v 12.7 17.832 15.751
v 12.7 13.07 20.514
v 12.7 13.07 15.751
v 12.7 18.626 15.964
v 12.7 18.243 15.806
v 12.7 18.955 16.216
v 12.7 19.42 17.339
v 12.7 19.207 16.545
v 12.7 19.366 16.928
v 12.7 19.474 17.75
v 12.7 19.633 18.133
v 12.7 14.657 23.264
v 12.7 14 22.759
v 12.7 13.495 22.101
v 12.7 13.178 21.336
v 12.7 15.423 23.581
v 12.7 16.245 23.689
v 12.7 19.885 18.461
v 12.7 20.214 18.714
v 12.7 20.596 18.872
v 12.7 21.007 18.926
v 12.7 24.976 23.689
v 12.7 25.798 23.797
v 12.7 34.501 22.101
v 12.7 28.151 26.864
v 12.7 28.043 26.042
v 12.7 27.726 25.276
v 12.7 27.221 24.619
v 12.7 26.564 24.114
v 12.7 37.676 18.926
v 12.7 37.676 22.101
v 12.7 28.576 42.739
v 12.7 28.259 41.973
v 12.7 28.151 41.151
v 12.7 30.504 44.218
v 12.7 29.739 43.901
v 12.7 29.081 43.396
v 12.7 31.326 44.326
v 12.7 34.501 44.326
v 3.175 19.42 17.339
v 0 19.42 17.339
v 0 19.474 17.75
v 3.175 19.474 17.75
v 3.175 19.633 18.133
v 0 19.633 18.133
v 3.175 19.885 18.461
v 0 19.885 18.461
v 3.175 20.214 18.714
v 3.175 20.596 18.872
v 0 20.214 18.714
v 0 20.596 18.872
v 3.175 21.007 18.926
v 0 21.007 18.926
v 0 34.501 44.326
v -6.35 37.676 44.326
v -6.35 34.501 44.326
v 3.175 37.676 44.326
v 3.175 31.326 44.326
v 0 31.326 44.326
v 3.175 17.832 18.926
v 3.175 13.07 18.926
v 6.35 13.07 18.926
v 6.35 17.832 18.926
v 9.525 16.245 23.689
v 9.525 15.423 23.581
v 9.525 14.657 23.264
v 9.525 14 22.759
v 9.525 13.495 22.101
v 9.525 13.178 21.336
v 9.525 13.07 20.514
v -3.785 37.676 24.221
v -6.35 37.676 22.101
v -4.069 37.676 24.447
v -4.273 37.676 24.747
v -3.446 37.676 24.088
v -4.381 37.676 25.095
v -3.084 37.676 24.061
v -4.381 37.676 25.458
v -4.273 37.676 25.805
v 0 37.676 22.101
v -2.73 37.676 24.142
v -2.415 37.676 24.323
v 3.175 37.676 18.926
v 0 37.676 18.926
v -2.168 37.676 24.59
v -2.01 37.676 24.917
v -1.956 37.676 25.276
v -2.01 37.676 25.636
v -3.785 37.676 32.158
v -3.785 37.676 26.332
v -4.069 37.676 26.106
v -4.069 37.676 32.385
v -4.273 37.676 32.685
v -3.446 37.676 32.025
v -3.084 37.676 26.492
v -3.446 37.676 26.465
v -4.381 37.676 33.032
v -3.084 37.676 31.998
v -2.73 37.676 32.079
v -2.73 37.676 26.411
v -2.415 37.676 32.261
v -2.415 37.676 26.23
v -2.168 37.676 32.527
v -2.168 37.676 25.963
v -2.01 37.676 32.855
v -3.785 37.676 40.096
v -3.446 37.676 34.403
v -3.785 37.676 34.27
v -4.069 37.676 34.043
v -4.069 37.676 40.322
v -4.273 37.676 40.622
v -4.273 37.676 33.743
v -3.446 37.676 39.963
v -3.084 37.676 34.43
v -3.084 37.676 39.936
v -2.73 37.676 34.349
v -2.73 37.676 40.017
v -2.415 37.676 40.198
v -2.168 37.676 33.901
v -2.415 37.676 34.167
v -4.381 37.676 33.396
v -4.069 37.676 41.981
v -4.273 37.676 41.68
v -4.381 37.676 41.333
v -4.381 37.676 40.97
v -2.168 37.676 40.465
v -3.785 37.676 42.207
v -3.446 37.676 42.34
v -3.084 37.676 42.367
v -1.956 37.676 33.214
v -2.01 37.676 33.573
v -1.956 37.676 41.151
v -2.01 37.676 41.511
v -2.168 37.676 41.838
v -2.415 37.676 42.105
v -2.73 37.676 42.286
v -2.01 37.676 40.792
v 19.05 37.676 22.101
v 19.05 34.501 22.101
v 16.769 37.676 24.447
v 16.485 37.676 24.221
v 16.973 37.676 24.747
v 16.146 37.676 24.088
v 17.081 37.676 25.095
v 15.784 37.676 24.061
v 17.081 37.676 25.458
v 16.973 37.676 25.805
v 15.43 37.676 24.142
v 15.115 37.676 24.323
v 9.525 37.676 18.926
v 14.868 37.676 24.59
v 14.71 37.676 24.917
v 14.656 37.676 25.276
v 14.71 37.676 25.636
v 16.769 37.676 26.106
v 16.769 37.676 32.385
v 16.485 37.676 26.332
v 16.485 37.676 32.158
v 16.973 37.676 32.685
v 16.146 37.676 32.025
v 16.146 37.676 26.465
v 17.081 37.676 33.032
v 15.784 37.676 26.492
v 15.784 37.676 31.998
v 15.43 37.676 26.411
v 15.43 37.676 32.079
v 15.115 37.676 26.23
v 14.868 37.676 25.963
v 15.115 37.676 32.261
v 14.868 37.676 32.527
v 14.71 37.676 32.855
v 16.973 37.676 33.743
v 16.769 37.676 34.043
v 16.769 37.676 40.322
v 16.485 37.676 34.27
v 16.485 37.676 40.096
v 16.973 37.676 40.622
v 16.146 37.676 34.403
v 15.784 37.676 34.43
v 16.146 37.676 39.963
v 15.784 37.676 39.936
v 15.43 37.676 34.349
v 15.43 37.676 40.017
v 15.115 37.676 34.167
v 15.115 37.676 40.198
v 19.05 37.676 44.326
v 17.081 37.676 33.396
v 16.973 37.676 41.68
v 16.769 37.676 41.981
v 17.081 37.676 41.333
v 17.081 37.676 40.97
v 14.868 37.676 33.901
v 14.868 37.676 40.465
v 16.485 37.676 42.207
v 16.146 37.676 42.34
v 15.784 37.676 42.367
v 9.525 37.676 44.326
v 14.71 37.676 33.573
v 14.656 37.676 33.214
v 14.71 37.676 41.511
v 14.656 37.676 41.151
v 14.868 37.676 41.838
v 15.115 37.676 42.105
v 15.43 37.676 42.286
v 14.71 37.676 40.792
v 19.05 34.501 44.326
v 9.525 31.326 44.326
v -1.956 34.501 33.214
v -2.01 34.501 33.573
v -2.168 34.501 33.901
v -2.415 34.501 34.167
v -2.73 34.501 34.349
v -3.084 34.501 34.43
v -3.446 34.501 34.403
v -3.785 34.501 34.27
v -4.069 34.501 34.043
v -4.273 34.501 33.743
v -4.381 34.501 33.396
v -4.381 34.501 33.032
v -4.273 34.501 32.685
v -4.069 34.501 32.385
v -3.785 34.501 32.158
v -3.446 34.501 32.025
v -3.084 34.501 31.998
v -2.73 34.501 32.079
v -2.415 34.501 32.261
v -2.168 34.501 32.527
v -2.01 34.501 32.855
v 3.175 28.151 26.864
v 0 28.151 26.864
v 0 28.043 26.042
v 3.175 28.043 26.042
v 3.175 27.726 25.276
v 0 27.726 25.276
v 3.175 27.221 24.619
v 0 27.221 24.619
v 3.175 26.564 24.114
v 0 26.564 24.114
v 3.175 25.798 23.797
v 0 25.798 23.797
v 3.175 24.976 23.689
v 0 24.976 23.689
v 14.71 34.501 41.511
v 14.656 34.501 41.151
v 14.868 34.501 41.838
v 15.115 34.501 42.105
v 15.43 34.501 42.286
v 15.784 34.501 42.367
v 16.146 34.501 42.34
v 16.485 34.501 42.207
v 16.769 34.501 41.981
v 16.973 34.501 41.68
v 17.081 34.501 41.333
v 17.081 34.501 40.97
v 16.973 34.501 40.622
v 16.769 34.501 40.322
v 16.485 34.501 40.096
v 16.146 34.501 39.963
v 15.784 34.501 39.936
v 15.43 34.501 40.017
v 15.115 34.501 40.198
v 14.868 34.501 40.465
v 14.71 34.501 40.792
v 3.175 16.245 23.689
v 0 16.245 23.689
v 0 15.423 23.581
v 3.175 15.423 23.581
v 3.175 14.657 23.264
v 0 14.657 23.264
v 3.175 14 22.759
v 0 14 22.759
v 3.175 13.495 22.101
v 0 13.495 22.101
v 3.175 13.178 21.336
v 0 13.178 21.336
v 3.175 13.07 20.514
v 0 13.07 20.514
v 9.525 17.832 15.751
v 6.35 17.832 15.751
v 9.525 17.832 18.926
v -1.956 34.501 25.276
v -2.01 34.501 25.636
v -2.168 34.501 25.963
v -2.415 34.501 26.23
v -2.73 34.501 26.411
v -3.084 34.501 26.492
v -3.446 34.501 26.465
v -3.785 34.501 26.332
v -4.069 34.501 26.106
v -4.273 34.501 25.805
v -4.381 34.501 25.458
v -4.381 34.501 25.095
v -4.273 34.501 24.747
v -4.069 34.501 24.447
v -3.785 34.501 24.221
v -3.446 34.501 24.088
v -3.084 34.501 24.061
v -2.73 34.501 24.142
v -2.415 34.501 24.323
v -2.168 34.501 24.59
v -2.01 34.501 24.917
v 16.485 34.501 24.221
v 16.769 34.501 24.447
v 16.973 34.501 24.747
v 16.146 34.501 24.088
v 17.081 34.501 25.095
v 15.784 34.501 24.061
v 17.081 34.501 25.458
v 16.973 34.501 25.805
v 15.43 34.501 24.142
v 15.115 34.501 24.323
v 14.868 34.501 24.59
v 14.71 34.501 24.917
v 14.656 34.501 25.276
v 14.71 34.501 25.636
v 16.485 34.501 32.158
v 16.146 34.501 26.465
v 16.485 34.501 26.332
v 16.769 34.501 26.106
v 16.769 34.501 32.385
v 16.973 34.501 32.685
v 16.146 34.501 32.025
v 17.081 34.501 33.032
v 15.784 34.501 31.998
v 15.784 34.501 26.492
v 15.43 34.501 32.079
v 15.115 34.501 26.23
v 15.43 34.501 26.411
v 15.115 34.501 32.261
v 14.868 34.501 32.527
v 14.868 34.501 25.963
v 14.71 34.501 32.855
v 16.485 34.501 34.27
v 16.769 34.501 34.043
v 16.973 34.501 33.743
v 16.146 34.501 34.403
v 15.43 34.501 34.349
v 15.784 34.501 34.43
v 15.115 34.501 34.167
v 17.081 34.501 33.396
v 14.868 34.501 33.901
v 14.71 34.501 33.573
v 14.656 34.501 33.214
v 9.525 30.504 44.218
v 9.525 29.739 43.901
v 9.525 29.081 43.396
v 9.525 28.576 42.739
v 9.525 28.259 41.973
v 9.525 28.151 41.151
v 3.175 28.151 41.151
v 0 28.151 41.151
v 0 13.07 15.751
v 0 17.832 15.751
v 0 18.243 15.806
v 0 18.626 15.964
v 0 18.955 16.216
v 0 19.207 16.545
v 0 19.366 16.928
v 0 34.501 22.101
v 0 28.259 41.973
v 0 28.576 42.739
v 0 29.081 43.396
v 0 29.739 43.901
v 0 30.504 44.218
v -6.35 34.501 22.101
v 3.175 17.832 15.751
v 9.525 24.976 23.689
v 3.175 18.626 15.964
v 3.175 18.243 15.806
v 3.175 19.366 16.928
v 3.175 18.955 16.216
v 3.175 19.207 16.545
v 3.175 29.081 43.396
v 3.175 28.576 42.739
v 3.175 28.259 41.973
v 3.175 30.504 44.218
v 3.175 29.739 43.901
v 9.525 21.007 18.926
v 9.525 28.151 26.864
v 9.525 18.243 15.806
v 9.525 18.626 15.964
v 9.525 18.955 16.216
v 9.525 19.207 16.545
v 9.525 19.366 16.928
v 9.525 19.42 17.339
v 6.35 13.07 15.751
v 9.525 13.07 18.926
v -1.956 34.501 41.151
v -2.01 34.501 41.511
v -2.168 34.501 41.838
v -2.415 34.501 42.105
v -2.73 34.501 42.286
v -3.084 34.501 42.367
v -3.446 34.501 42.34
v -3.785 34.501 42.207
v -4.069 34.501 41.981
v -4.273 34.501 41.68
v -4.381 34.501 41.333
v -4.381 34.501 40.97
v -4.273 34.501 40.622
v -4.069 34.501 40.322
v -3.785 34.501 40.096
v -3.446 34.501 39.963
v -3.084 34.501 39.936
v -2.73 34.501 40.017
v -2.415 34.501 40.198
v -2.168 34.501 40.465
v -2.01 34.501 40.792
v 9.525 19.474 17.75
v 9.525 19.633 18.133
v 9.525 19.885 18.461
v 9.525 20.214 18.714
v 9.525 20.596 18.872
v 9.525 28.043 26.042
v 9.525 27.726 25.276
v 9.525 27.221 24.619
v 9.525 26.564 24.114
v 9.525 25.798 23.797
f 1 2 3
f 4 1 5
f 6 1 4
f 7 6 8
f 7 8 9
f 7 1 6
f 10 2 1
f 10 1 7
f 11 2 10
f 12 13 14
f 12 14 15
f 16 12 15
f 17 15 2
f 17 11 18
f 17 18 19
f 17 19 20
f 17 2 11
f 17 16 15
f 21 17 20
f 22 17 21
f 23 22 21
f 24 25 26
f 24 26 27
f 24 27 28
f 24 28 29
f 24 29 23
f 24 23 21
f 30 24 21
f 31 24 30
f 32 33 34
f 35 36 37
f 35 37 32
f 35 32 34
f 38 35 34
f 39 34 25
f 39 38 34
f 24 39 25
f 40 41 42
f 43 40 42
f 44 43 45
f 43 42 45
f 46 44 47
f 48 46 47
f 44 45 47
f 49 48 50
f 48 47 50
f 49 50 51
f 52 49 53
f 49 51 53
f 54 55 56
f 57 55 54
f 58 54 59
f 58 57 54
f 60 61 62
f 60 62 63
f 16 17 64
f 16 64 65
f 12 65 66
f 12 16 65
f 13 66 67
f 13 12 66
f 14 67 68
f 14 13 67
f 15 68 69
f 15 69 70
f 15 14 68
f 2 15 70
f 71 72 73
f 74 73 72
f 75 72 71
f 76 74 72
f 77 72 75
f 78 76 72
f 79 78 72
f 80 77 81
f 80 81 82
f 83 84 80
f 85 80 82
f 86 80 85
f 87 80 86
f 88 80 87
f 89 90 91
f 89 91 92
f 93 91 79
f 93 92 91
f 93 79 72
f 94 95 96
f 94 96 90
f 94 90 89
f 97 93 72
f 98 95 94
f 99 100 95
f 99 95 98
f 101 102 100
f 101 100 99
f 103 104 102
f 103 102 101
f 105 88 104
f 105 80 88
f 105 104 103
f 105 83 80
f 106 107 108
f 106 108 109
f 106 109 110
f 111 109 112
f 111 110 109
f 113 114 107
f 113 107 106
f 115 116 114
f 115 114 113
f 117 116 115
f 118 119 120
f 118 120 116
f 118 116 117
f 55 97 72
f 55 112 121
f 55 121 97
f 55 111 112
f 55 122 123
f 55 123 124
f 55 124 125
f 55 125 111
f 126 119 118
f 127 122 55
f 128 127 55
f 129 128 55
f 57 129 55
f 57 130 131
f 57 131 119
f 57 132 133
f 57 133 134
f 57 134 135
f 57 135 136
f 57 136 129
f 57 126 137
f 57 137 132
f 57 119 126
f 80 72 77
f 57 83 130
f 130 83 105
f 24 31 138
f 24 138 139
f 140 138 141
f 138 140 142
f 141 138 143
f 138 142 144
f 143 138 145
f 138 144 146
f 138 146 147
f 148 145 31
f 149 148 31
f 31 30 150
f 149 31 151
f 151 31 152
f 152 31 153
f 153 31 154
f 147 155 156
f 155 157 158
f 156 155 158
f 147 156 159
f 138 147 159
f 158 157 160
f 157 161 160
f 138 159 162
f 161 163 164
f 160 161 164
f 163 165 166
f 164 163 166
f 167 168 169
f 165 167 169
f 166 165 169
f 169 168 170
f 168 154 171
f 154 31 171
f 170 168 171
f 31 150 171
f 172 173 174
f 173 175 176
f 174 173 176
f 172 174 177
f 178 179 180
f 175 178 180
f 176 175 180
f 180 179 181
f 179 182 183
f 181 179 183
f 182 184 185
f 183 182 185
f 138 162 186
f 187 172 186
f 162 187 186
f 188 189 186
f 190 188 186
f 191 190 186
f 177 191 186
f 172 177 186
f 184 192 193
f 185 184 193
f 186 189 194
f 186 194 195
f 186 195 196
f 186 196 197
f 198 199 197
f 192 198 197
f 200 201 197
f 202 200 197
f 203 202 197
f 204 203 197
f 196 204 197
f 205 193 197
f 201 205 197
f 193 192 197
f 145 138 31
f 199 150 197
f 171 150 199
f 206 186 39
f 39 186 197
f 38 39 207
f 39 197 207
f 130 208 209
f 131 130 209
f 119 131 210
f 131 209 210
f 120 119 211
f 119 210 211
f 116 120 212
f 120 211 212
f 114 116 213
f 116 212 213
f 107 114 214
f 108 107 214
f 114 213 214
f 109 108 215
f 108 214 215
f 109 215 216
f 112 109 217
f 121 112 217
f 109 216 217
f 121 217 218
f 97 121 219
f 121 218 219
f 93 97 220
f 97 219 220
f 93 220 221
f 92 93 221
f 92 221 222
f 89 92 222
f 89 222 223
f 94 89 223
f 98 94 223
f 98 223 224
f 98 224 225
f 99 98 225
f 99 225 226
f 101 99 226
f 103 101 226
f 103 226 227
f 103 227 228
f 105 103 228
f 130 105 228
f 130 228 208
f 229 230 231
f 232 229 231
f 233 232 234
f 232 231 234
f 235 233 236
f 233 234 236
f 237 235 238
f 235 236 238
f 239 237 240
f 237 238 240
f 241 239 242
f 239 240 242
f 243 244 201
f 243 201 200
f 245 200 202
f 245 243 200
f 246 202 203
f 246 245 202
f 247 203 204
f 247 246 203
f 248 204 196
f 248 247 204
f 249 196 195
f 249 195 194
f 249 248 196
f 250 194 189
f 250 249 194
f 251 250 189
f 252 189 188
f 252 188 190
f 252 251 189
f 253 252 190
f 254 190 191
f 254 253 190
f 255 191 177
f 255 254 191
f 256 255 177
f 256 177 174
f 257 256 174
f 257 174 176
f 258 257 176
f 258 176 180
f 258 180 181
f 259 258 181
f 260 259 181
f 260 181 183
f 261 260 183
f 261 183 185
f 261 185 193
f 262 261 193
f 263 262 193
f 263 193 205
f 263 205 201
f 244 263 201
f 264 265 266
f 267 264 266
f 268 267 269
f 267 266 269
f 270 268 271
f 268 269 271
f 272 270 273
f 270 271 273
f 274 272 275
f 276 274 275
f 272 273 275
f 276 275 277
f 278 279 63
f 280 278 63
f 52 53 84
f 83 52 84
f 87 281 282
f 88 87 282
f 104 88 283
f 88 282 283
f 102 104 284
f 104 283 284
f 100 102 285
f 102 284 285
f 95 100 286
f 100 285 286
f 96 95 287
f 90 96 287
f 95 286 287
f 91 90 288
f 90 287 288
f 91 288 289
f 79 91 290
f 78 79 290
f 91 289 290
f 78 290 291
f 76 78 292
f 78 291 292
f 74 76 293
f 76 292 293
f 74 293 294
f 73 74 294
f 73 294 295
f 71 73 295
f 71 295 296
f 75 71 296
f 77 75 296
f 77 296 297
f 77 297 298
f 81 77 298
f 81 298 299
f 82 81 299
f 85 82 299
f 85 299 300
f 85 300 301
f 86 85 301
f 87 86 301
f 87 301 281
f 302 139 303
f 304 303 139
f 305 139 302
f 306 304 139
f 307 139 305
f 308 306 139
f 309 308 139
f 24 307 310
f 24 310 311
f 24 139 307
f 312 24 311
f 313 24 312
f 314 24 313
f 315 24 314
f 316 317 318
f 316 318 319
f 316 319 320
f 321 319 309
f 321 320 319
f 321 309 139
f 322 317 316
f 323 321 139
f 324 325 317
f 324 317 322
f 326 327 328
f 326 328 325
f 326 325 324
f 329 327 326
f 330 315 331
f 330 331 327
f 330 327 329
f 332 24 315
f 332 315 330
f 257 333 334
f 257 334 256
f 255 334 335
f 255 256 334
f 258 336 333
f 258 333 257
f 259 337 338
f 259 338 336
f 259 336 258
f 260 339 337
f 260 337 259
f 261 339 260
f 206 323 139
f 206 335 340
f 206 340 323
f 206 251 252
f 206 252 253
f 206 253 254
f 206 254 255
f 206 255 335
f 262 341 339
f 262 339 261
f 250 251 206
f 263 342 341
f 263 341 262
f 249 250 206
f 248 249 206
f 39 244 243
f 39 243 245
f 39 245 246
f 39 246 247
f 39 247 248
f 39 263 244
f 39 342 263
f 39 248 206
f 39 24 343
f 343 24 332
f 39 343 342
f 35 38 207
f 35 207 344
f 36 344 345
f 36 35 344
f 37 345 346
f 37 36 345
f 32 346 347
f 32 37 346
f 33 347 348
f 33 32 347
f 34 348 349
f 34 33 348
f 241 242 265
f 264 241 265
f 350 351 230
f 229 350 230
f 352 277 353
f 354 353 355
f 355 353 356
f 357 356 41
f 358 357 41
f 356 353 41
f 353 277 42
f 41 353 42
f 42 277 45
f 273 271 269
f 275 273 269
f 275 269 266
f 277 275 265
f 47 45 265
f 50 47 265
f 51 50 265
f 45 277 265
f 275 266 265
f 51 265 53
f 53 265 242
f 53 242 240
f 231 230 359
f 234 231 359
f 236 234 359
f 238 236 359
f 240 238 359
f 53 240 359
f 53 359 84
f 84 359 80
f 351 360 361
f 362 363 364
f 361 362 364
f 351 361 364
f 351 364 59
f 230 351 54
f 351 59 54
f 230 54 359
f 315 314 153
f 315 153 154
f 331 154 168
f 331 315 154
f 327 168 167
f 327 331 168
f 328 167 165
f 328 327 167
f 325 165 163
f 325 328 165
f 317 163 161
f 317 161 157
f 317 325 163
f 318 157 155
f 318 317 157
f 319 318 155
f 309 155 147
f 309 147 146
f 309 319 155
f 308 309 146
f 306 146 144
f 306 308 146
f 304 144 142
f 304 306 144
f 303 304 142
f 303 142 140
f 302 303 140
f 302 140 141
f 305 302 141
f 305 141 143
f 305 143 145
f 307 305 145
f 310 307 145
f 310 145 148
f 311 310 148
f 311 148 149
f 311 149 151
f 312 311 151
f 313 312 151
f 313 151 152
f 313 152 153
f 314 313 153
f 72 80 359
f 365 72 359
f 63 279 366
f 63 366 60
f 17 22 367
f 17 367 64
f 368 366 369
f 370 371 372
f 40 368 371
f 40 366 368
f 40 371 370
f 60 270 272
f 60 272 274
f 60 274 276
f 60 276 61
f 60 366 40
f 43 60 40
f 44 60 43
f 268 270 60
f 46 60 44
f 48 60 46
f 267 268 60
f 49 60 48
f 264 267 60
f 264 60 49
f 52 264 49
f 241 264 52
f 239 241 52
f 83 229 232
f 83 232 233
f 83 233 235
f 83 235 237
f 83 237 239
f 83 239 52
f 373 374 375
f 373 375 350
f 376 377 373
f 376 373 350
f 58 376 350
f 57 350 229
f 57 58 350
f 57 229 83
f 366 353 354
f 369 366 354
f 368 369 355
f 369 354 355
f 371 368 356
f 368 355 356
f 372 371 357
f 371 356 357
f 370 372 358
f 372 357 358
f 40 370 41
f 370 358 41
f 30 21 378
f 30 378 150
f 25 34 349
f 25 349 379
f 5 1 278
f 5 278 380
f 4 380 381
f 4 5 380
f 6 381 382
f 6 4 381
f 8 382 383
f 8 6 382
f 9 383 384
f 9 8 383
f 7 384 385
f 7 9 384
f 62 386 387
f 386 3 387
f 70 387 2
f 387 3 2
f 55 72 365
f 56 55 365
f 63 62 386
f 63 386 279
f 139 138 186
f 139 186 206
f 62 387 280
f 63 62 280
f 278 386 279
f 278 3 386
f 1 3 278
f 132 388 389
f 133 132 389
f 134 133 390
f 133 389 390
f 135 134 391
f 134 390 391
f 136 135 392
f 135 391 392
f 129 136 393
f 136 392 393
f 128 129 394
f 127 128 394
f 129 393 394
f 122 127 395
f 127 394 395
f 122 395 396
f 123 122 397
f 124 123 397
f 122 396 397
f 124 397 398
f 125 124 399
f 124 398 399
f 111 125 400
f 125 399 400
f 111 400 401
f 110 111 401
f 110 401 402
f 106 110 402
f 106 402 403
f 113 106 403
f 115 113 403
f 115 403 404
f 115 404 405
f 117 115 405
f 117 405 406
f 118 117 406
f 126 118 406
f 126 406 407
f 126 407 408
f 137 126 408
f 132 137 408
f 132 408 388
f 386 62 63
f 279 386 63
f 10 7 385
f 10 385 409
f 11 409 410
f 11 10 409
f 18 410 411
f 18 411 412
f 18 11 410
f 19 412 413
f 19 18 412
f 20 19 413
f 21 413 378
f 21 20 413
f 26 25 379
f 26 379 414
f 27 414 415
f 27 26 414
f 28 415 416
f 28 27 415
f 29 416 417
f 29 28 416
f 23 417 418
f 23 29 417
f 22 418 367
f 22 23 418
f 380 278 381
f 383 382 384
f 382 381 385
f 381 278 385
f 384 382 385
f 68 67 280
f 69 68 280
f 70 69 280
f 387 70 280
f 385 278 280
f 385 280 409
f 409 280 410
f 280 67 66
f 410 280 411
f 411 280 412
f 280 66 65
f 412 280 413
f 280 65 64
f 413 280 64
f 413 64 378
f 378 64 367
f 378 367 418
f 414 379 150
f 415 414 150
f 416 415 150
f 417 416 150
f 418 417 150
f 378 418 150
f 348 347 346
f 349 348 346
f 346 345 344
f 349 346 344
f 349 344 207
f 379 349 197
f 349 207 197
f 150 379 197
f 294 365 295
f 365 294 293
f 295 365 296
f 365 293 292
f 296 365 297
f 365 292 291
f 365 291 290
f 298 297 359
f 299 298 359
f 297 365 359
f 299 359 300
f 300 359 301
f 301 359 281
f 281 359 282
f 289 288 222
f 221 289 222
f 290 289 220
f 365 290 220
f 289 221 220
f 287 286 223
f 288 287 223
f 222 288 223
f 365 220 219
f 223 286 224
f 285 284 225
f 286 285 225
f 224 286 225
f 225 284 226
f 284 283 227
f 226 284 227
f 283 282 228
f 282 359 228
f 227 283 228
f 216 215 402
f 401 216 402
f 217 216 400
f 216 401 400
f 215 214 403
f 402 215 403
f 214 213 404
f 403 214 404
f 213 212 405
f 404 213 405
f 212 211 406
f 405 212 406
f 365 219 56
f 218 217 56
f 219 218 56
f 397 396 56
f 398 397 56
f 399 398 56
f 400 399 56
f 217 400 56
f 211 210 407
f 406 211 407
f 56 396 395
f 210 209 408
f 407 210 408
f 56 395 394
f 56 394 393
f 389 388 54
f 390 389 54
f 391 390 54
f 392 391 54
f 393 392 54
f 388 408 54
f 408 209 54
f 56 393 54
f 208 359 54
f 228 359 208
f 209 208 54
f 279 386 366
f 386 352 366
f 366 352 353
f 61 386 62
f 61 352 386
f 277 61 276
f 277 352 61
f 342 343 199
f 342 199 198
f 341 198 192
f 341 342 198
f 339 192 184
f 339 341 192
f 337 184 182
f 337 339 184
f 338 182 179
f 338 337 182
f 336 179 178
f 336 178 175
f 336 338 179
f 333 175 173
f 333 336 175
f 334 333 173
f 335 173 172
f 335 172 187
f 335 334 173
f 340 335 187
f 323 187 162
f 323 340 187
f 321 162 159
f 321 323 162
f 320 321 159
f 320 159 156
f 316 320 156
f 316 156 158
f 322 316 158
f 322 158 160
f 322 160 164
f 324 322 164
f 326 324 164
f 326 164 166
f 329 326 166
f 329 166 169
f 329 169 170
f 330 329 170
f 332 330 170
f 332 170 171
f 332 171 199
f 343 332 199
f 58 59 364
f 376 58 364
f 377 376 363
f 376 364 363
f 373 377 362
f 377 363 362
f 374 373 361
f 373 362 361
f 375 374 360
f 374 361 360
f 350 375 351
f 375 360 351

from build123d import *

# Parameters (mm, degrees)
F1_DEPTH = 3.175
F2_W     = 4.7625
F2_H     = 3.175
F3_DEPTH = 3.175
F4_W     = 3.175
F4_H     = 22.225
F5_DEPTH = 6.35
F6_R     = 1.2192
F7_DEPTH = 25.4


with BuildPart() as f1:
    # F0 (on Right) → F1 (new body)
    with BuildSketch(Plane.YZ):
        with BuildLine():
            Line((37.6760785595, 44.3264348761), (31.3260785595, 44.3264348761))
            ThreePointArc((31.3260785595, 44.3264348761), (29.0810145292, 43.3964989063), (28.1510785595, 41.1514348761))
            Line((28.1510785595, 41.1514348761), (28.1510785595, 26.8639348761))
            ThreePointArc((28.1510785595, 26.8639348761), (27.2211425898, 24.6188708458), (24.9760785595, 23.6889348761))
            Line((24.9760785595, 23.6889348761), (16.2448285595, 23.6889348761))
            ThreePointArc((16.2448285595, 23.6889348761), (13.9997645292, 22.7589989063), (13.0698285595, 20.5139348761))
            Line((13.0698285595, 20.5139348761), (13.0698285595, 15.7514348761))
            Line((13.0698285595, 15.7514348761), (17.8323285595, 15.7514348761))
            ThreePointArc((17.8323285595, 15.7514348761), (18.9548605746, 16.2164028609), (19.4198285595, 17.3389348761))
            ThreePointArc((19.4198285595, 17.3389348761), (19.8847965444, 18.4614668912), (21.0073285595, 18.9264348761))
            Line((21.0073285595, 18.9264348761), (37.6760785595, 18.9264348761))
            Line((37.6760785595, 18.9264348761), (37.6760785595, 44.3264348761))
        make_face()
    extrude(amount=F1_DEPTH)

    # F2 (on face) → F3 (join)
    with BuildSketch(Plane.YZ.offset(3.175)):
        with Locations((15.4510785595, 17.3389348761)):
            Rectangle(F2_W, F2_H)
    extrude(amount=F3_DEPTH)

    # F4 (on face) → F5 (join)
    with BuildSketch(Plane(origin=(0, 0, 0), x_dir=(0, -1, 0), z_dir=(-1, 0, 0))):
        with Locations((-36.0885785595, 33.2139348761)):
            Rectangle(F4_W, F4_H)
    extrude(amount=F5_DEPTH)

    # F6 (on face) → F7 (cut)
    with BuildSketch(Plane.XZ.offset(-34.5010785595)):
        with Locations((-3.175, 41.1514348761)):
            Circle(F6_R)
        with Locations((-3.175, 33.2139348761)):
            Circle(F6_R)
        with Locations((-3.175, 25.2764348761)):
            Circle(F6_R)
    extrude(amount=-F7_DEPTH, mode=Mode.SUBTRACT)


with BuildPart() as f8_1:
    # F8: instance of F1
    add(f1.part.mirror(Plane(origin=(6.35, 15.4510785595, 17.3389348761), x_dir=(0, 1, 0), z_dir=(1, 0, 0))))


solid = Compound([f1.part, f8_1.part])
